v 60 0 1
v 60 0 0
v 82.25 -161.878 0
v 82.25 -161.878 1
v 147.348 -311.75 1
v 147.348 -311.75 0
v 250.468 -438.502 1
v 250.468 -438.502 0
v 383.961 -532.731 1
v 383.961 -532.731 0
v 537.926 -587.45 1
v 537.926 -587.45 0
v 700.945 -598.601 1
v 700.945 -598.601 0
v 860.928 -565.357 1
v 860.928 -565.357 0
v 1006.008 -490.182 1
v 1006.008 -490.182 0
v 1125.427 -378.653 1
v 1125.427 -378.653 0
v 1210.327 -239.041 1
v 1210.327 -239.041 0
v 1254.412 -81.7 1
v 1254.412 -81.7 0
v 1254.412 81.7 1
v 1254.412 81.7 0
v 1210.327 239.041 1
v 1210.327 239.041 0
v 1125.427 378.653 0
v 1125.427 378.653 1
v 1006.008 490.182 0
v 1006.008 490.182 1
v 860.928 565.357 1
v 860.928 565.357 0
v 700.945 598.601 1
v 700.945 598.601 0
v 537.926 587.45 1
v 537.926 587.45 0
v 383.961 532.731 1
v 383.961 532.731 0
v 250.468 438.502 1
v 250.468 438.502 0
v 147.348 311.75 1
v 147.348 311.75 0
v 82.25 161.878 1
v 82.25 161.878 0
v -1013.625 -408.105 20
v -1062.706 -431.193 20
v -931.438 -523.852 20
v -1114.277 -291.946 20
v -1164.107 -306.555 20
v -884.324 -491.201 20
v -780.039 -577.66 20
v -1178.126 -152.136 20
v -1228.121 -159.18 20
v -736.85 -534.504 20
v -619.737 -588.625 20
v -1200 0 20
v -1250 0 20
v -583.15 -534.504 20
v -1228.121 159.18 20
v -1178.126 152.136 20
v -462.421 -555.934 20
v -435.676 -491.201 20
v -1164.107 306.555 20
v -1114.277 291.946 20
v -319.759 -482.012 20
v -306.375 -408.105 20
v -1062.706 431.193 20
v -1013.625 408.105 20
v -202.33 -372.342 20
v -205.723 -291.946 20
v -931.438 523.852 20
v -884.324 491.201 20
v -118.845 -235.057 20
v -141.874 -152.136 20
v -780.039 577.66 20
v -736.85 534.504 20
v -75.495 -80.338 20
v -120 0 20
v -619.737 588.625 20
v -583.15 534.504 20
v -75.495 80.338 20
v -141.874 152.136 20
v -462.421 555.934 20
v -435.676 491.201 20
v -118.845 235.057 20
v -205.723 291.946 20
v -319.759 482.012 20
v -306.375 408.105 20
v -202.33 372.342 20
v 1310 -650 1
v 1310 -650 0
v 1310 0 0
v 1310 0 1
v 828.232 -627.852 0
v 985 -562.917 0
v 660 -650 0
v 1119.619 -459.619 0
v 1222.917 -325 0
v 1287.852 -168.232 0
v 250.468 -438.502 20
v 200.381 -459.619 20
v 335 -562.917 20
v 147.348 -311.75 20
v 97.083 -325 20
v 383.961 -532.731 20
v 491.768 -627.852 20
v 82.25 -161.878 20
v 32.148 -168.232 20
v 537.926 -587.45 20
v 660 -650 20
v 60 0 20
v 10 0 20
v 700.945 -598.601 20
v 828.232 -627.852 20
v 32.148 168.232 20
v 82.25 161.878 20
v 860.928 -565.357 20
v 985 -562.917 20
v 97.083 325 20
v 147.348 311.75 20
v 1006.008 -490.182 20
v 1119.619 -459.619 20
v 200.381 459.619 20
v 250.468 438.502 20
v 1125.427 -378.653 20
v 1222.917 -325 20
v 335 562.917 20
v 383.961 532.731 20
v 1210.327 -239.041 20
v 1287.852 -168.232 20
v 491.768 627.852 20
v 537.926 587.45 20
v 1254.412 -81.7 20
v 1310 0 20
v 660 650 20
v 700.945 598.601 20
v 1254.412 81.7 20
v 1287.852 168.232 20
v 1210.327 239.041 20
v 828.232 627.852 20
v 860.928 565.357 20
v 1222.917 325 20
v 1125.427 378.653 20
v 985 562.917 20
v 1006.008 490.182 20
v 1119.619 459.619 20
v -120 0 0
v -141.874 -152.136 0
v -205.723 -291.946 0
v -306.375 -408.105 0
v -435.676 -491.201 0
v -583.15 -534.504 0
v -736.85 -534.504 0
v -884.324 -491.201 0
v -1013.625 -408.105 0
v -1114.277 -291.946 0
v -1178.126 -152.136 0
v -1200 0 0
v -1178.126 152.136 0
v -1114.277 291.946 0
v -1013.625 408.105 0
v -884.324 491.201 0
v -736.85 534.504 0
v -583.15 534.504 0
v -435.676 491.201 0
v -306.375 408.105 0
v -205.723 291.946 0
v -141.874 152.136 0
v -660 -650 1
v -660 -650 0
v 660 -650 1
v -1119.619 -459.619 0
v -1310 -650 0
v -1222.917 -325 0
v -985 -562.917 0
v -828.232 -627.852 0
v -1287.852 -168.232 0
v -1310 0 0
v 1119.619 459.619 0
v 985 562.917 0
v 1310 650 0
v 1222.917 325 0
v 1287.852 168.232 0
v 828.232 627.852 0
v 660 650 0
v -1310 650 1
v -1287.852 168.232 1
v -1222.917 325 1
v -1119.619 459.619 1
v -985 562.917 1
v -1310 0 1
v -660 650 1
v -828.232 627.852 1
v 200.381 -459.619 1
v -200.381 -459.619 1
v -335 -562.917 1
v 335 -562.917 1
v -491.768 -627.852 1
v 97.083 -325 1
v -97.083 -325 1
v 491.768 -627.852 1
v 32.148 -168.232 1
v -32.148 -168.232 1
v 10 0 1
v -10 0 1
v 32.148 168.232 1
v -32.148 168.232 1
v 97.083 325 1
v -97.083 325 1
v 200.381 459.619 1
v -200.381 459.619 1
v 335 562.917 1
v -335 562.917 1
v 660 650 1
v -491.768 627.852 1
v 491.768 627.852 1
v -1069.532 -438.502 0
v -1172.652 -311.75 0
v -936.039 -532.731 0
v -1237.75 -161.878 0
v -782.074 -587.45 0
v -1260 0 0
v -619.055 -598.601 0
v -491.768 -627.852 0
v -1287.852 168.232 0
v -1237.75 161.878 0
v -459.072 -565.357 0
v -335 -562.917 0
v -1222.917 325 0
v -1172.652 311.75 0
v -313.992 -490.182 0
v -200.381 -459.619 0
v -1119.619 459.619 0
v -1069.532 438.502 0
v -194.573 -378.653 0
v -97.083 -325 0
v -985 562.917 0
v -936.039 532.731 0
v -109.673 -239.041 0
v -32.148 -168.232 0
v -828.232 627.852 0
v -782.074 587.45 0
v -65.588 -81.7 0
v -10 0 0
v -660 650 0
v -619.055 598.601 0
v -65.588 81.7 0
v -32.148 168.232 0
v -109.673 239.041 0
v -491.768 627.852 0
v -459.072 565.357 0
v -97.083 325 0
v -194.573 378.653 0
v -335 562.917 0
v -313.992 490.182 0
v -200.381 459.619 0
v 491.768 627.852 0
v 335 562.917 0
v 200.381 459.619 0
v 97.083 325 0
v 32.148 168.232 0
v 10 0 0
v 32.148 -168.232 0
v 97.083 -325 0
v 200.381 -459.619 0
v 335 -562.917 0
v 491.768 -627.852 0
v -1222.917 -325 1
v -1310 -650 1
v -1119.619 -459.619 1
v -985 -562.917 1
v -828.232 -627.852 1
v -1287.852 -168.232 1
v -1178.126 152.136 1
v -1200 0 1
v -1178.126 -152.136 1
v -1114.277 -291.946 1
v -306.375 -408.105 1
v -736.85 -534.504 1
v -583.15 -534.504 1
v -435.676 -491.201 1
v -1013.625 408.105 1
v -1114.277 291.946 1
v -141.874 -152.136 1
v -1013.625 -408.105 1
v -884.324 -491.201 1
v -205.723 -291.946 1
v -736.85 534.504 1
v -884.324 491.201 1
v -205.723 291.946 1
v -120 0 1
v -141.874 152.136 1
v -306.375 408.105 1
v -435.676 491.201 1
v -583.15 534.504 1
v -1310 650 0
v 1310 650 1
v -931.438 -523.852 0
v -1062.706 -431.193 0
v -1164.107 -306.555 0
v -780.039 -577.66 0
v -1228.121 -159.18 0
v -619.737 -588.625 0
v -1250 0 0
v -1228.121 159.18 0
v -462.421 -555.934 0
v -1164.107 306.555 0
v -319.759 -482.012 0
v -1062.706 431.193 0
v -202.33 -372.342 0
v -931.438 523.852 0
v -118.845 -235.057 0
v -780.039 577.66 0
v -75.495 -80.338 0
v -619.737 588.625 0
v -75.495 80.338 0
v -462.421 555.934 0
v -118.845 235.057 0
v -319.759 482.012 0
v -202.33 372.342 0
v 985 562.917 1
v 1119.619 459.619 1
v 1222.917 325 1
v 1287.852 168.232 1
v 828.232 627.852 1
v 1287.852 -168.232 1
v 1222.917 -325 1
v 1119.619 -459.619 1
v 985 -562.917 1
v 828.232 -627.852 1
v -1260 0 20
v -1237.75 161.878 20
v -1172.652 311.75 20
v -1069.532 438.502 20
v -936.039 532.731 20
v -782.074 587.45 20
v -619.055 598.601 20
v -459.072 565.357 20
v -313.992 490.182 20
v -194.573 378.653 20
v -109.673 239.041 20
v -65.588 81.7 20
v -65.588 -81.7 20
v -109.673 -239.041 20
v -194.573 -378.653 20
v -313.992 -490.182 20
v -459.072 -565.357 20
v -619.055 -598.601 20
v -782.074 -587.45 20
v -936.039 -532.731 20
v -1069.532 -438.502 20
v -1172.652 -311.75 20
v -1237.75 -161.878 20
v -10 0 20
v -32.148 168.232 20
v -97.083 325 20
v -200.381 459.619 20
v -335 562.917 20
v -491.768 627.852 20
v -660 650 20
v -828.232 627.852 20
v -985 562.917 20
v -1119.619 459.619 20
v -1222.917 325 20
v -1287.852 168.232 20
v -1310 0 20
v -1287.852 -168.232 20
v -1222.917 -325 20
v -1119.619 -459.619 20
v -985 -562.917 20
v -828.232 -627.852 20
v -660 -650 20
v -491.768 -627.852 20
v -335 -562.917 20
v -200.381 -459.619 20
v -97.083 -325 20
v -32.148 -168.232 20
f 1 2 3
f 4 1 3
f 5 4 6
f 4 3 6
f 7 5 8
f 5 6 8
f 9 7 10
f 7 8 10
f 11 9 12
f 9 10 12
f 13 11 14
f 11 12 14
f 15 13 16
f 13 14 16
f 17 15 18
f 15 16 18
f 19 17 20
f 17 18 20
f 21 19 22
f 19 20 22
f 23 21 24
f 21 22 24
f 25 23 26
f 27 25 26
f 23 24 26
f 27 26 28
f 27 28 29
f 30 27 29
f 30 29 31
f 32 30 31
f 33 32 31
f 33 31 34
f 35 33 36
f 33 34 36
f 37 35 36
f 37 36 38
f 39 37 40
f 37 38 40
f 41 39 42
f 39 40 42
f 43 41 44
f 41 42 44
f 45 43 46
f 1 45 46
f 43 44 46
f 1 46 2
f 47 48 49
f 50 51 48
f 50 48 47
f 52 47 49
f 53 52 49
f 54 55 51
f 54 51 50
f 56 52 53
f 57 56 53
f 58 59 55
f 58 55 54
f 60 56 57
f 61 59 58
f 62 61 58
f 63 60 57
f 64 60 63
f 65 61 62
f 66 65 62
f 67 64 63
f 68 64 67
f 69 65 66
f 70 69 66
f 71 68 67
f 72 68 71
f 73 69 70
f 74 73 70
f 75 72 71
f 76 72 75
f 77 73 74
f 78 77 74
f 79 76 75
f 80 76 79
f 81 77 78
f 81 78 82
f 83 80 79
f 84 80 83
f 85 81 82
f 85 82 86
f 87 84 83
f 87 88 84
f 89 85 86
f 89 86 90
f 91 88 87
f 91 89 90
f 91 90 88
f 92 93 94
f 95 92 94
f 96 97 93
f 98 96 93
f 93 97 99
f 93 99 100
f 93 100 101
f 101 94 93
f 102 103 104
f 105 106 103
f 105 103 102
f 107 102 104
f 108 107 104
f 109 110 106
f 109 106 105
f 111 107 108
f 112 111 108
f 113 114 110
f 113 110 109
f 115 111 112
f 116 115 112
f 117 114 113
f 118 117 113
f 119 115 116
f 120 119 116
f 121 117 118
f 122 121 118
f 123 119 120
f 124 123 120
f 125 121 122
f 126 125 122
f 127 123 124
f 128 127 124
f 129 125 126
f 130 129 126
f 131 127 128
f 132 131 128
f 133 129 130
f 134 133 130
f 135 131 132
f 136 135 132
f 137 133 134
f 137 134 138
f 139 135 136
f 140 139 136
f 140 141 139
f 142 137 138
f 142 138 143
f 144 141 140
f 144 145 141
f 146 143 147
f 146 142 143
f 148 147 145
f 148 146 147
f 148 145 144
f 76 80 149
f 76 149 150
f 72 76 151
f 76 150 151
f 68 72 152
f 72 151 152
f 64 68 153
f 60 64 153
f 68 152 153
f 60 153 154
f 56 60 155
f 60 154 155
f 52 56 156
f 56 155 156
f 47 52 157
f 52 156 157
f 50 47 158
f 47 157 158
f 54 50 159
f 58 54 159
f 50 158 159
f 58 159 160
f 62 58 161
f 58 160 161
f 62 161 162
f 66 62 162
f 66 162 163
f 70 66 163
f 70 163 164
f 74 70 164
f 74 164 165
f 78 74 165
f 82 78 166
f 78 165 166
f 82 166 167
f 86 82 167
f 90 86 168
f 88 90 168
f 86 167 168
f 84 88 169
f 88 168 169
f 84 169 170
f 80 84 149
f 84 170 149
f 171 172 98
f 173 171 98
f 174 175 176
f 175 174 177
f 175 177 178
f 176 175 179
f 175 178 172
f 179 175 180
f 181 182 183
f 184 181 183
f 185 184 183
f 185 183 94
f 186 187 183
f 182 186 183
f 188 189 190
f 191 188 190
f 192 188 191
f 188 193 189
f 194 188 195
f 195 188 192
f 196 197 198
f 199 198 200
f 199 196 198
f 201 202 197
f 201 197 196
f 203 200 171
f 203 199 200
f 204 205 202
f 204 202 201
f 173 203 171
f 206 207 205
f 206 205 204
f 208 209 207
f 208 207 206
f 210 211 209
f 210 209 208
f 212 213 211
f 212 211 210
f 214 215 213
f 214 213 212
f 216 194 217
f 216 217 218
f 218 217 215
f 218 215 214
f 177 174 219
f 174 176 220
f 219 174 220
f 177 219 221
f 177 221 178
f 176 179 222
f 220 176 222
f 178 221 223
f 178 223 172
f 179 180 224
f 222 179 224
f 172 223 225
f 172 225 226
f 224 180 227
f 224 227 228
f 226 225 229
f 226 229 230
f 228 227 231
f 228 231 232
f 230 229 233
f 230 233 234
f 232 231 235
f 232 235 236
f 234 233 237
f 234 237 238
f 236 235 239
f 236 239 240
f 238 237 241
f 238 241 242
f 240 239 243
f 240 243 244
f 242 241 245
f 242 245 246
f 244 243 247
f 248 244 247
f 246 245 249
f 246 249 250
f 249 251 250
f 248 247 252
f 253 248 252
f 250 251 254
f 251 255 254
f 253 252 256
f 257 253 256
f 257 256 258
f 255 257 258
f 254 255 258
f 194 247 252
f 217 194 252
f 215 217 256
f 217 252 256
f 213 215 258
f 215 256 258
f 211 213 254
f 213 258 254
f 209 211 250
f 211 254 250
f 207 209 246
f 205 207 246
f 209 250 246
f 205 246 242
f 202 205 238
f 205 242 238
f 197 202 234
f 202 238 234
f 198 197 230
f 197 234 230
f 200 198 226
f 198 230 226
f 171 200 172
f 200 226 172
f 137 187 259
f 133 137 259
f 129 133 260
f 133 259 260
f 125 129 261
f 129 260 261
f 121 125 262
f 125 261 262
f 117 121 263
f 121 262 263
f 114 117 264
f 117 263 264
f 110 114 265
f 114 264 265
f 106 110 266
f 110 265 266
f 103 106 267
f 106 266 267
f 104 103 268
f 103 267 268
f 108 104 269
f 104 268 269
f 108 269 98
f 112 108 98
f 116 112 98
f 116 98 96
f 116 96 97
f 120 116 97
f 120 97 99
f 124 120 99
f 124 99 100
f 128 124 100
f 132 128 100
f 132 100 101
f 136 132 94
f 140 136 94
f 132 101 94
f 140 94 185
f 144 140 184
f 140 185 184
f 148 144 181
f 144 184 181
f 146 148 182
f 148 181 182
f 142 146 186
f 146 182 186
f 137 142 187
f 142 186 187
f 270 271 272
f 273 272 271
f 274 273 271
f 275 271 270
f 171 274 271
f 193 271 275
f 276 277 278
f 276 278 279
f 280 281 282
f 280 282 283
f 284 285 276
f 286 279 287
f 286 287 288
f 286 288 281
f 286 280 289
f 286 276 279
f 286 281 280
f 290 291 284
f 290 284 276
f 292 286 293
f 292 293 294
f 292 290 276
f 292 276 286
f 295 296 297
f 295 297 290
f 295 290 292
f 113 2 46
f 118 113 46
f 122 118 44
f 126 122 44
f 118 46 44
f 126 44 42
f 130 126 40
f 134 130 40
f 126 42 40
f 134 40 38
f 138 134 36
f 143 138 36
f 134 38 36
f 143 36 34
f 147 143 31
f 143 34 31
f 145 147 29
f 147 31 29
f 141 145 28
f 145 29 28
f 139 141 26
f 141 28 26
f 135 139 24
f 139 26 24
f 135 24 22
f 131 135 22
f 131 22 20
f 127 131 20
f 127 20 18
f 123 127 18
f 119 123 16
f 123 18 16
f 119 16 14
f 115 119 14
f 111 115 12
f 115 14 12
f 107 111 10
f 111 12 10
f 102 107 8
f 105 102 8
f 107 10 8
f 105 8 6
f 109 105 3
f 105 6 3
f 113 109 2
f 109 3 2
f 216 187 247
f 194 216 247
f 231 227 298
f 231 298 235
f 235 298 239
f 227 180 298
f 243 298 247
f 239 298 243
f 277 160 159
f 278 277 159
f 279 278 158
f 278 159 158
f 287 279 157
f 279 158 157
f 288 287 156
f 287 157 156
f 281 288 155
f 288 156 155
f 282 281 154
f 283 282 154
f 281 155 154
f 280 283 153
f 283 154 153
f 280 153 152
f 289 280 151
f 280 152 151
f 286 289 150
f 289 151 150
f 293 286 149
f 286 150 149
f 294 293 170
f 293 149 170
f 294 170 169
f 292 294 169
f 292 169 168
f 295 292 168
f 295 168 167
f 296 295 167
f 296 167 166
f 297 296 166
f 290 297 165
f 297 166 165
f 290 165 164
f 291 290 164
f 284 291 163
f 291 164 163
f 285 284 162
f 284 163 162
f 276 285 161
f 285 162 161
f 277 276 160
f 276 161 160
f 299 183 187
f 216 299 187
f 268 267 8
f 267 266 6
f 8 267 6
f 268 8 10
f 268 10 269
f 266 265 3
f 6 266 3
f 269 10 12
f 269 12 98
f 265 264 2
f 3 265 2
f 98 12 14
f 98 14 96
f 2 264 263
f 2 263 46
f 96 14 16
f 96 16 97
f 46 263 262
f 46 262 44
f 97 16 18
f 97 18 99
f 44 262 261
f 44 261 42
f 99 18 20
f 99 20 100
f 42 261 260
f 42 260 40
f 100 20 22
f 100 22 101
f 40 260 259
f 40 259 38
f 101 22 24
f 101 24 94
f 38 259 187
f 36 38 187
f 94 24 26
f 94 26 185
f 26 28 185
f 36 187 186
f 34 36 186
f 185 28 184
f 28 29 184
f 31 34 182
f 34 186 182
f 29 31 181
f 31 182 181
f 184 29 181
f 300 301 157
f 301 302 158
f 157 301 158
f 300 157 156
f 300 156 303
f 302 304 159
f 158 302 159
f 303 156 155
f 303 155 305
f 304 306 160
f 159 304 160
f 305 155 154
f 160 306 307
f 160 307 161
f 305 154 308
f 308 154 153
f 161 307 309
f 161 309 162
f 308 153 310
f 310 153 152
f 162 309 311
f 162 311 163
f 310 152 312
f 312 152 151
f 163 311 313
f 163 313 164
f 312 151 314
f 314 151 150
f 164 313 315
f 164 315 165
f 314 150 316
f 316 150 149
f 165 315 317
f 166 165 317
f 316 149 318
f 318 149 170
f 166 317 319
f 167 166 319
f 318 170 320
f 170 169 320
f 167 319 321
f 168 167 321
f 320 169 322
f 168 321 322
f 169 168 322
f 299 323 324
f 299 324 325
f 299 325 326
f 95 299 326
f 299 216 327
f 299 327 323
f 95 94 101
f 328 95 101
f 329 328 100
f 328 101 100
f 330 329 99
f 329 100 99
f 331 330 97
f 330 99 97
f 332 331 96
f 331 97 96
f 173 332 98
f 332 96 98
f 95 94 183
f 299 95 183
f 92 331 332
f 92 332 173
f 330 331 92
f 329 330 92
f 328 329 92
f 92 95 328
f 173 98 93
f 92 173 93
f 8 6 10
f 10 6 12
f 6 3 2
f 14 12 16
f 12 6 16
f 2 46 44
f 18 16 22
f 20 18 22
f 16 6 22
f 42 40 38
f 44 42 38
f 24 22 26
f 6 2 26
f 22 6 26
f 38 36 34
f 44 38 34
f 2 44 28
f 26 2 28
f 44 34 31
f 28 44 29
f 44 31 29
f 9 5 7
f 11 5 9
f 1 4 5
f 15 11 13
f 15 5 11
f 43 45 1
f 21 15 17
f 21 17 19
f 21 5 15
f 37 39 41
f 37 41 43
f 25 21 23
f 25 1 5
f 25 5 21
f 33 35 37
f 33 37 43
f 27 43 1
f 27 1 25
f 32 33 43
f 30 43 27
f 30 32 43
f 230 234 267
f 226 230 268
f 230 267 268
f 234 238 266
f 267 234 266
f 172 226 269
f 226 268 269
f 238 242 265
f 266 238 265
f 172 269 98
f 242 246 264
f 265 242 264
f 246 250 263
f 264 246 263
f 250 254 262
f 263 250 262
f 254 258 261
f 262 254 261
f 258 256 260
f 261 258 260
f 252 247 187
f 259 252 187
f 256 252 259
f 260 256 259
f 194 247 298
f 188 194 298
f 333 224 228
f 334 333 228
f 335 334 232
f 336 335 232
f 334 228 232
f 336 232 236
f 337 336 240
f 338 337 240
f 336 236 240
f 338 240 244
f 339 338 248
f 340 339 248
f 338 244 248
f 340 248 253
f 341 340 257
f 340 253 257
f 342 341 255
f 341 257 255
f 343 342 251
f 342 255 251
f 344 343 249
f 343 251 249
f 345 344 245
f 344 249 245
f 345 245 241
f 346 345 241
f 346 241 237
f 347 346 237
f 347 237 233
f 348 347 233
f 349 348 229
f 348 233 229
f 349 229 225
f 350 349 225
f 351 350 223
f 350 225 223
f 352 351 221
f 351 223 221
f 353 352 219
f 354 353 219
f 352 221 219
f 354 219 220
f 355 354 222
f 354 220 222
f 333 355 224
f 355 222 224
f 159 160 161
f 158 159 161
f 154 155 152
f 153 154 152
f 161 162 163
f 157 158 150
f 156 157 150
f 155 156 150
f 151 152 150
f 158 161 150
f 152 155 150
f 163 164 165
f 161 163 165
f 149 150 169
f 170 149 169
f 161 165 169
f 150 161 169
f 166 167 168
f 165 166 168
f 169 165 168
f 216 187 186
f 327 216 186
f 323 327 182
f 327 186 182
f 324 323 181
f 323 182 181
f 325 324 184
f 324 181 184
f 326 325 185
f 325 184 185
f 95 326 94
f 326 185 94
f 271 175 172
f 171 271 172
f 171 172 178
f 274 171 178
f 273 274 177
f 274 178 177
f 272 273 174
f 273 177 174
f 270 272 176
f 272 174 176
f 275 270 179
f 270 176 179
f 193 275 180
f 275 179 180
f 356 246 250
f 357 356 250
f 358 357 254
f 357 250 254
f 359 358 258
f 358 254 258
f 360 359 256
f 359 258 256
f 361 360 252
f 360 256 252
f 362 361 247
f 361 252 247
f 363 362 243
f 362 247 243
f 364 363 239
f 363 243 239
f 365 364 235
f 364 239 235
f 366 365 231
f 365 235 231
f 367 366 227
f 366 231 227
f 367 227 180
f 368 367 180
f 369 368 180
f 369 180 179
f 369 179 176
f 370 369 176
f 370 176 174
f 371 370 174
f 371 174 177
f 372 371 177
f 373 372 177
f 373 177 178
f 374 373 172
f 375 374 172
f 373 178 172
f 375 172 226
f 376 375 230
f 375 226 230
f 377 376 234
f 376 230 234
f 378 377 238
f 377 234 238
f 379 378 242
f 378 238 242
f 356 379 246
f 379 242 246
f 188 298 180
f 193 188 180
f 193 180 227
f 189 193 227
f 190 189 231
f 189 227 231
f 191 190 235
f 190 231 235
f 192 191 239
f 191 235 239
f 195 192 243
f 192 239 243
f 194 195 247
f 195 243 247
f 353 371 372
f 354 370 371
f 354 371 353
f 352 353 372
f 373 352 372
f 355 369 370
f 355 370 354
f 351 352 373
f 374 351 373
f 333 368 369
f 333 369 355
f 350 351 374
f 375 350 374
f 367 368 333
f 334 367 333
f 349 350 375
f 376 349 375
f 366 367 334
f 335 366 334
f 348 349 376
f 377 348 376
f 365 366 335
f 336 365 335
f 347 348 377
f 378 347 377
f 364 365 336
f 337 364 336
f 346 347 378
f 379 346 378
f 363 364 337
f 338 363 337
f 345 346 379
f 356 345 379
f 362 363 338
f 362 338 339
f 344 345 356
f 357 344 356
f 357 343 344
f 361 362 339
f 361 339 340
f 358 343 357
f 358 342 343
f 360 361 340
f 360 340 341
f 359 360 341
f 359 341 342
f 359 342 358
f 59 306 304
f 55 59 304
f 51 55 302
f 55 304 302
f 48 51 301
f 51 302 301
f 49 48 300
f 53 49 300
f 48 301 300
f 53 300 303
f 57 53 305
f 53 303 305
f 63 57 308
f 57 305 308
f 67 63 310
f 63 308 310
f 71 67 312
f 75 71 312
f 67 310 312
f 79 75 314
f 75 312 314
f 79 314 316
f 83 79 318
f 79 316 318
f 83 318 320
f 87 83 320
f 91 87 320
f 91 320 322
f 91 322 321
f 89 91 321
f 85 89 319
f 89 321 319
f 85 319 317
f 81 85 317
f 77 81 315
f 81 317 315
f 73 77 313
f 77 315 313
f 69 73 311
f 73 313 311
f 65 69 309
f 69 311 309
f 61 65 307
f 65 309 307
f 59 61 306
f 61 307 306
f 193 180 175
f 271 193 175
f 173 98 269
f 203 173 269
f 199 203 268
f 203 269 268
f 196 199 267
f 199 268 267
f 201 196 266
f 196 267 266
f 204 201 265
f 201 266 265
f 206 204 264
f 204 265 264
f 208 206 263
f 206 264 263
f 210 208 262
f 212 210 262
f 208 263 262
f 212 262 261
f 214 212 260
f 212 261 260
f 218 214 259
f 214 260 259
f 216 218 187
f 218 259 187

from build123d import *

# Parameters (mm, degrees)
F1_DEPTH = 20
F2_DEPTH = 20
F3_DEPTH = 1


with BuildPart() as f1:
    # F0 (on Top) → F1 (new body)
    with BuildSketch(Plane.XY):
        with BuildLine():
            ThreePointArc((-1310, 0), (-1119.6194077713, -459.6194077713), (-660, -650))
            ThreePointArc((-660, -650), (-200.3805922287, -459.6194077713), (-10, 0))
            Line((-10, 0), (-60, 0))
            ThreePointArc((-60, 0), (-660, -600), (-1260, 0))
            Line((-1260, 0), (-1310, 0))
        make_face()
        with BuildLine():
            ThreePointArc((-660, 650), (-1119.6194077713, 459.6194077713), (-1310, 0))
            Line((-1310, 0), (-1260, 0))
            ThreePointArc((-1260, 0), (-660, 600), (-60, 0))
            Line((-60, 0), (-10, 0))
            ThreePointArc((-10, 0), (-200.3805922287, 459.6194077713), (-660, 650))
        make_face()
    extrude(amount=F1_DEPTH)


with BuildPart() as f1b:
    # F0 (on Top) → F1, piece 2 (new body)
    with BuildSketch(Plane.XY):
        with BuildLine():
            ThreePointArc((10, 0), (200.3805922288, -459.6194077713), (660, -650))
            ThreePointArc((660, -650), (1119.6194077713, -459.6194077712), (1310, 0))
            ThreePointArc((1310, 0), (1119.6194077713, 459.6194077713), (660, 650))
            ThreePointArc((660, 650), (200.3805922287, 459.6194077713), (10, 0))
        make_face()
        with BuildLine():
            ThreePointArc((1260, 0), (660, -600), (60, 0))
            ThreePointArc((60, 0), (660, 600), (1260, 0))
        make_face(mode=Mode.SUBTRACT)
    extrude(amount=F1_DEPTH)


with BuildPart() as f2:
    # F0 (on Top) → F2 (new body)
    with BuildSketch(Plane.XY):
        with BuildLine():
            ThreePointArc((-70, 0), (-660, 590), (-1250, 0))
            Line((-1250, 0), (-1200, 0))
            ThreePointArc((-1200, 0), (-660, 540), (-120, 0))
            Line((-120, 0), (-70, 0))
        make_face()
        with BuildLine():
            Line((-1200, 0), (-1250, 0))
            ThreePointArc((-1250, 0), (-660, -590), (-70, 0))
            Line((-70, 0), (-120, 0))
            ThreePointArc((-120, 0), (-660, -540), (-1200, 0))
        make_face()
    extrude(amount=F2_DEPTH)


with BuildPart() as f3:
    # F0 (on Top) → F3 (new body)
    with BuildSketch(Plane.XY):
        with BuildLine():
            Line((-1310, 650), (-1310, 0))
            ThreePointArc((-1310, 0), (-1119.6194077713, 459.6194077713), (-660, 650))
            Line((-660, 650), (-1310, 650))
        make_face()
    extrude(amount=F3_DEPTH)


with BuildPart() as f3b:
    # F0 (on Top) → F3, piece 2 (new body)
    with BuildSketch(Plane.XY):
        with BuildLine():
            Line((-10, 0), (10, 0))
            ThreePointArc((10, 0), (200.3805922287, 459.6194077713), (660, 650))
            Line((660, 650), (-660, 650))
            ThreePointArc((-660, 650), (-200.3805922287, 459.6194077713), (-10, 0))
        make_face()
        with BuildLine():
            Line((-660, -650), (660, -650))
            ThreePointArc((660, -650), (200.3805922288, -459.6194077713), (10, 0))
            Line((10, 0), (-10, 0))
            ThreePointArc((-10, 0), (-200.3805922287, -459.6194077713), (-660, -650))
        make_face()
    extrude(amount=F3_DEPTH)


with BuildPart() as f3c:
    # F0 (on Top) → F3, piece 3 (new body)
    with BuildSketch(Plane.XY):
        with BuildLine():
            Line((-1310, -650), (-660, -650))
            ThreePointArc((-660, -650), (-1119.6194077713, -459.6194077713), (-1310, 0))
            Line((-1310, 0), (-1310, -650))
        make_face()
    extrude(amount=F3_DEPTH)


with BuildPart() as f3d:
    # F0 (on Top) → F3, piece 4 (new body)
    with BuildSketch(Plane.XY):
        with BuildLine():
            Line((660, -650), (1310, -650))
            Line((1310, -650), (1310, 0))
            ThreePointArc((1310, 0), (1119.6194077713, -459.6194077712), (660, -650))
        make_face()
    extrude(amount=F3_DEPTH)


with BuildPart() as f3e:
    # F0 (on Top) → F3, piece 5 (new body)
    with BuildSketch(Plane.XY):
        with BuildLine():
            ThreePointArc((660, 650), (1119.6194077713, 459.6194077713), (1310, 0))
            Line((1310, 0), (1310, 650))
            Line((1310, 650), (660, 650))
        make_face()
    extrude(amount=F3_DEPTH)


with BuildPart() as f3f:
    # F0 (on Top) → F3, piece 6 (new body)
    with BuildSketch(Plane.XY):
        with BuildLine():
            ThreePointArc((-120, 0), (-660, 540), (-1200, 0))
            Line((-1200, 0), (-660, 0))
            Line((-660, 0), (-120, 0))
        make_face()
        with BuildLine():
            Line((-660, 0), (-1200, 0))
            ThreePointArc((-1200, 0), (-660, -540), (-120, 0))
            Line((-120, 0), (-660, 0))
        make_face()
    extrude(amount=F3_DEPTH)


with BuildPart() as f3g:
    # F0 (on Top) → F3, piece 7 (new body)
    with BuildSketch(Plane.XY):
        with BuildLine():
            ThreePointArc((1260, 0), (660, 600), (60, 0))
            ThreePointArc((60, 0), (660, -600), (1260, 0))
        make_face()
    extrude(amount=F3_DEPTH)


solid = Compound([f1.part, f1b.part, f2.part, f3.part, f3b.part, f3c.part, f3d.part, f3e.part, f3f.part, f3g.part])
